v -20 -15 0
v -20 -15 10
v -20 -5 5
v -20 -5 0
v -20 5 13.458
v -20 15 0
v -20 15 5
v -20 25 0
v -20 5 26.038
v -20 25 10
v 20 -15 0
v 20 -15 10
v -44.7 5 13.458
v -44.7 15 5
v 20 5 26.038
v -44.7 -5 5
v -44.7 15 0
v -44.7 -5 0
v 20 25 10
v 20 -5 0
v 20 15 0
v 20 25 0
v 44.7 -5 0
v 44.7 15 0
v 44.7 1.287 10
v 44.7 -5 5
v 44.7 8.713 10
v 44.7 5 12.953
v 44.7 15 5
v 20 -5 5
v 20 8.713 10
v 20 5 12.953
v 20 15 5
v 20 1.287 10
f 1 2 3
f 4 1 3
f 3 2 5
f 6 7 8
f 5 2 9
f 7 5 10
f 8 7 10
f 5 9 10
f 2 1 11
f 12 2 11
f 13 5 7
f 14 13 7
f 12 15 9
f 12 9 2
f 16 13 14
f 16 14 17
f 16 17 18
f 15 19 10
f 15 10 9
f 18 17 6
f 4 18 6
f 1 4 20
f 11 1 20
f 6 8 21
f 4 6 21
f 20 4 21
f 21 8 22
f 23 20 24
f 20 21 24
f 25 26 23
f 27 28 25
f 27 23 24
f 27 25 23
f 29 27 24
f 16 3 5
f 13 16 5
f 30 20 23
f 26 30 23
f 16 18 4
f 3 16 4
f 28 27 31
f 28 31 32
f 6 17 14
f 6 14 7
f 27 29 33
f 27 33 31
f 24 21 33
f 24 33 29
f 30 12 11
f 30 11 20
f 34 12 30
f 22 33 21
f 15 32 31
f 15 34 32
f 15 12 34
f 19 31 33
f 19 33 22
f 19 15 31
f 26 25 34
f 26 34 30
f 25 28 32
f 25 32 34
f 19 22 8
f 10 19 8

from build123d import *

# Parameters (mm, degrees)
F1_DEPTH = 10
F0_W     = 24.7
F0_H     = 20
F2_DEPTH = 5
F5_DEPTH = 24.7
F6_DEPTH = 40
F9_DEPTH = 24.7


with BuildPart() as f1:
    # F0 (on Top) → F1 (new body)
    with BuildSketch(Plane.XY):
        Polygon((-20, 25), (-20, 15), (-20, -5), (-20, -15), (20, -15), (20, -5), (20, 15), (20, 25), align=None)
    extrude(amount=F1_DEPTH)

    # F0 (on Top) → F2 (join)
    with BuildSketch(Plane.XY):
        with Locations((-32.35, 5)):
            Rectangle(F0_W, F0_H)
        Polygon((-20, 25), (-20, 15), (-20, -5), (-20, -15), (20, -15), (20, -5), (20, 15), (20, 25), align=None)
        with Locations((32.35, 5)):
            Rectangle(F0_W, F0_H)
    extrude(amount=F2_DEPTH)

    # F4 (on offset) → F5 (join)
    with BuildSketch(Plane.YZ.offset(20)):
        Polygon((-5, 5), (15, 5), (8.7127050693, 10), (1.2872949307, 10), align=None)
        Polygon((1.2872949307, 10), (8.7127050693, 10), (5, 12.9525456578), align=None)
    extrude(amount=F5_DEPTH)

    # F4 (on offset) → F6 (join)
    with BuildSketch(Plane.YZ.offset(20)):
        Polygon((5, 12.9525456578), (8.7127050693, 10), (25, 10), (5, 26.0377600789), (-15, 10), (1.2872949307, 10), align=None)
        Polygon((1.2872949307, 10), (8.7127050693, 10), (5, 12.9525456578), align=None)
    extrude(amount=-F6_DEPTH)

    # F8 (on offset) → F9 (join)
    with BuildSketch(Plane(origin=(-20, 0, 0), x_dir=(0, -1, 0), z_dir=(-1, 0, 0))):
        Polygon((-15, 5), (5, 5), (-5, 13.4582445025), align=None)
    extrude(amount=F9_DEPTH)


solid = f1.part
